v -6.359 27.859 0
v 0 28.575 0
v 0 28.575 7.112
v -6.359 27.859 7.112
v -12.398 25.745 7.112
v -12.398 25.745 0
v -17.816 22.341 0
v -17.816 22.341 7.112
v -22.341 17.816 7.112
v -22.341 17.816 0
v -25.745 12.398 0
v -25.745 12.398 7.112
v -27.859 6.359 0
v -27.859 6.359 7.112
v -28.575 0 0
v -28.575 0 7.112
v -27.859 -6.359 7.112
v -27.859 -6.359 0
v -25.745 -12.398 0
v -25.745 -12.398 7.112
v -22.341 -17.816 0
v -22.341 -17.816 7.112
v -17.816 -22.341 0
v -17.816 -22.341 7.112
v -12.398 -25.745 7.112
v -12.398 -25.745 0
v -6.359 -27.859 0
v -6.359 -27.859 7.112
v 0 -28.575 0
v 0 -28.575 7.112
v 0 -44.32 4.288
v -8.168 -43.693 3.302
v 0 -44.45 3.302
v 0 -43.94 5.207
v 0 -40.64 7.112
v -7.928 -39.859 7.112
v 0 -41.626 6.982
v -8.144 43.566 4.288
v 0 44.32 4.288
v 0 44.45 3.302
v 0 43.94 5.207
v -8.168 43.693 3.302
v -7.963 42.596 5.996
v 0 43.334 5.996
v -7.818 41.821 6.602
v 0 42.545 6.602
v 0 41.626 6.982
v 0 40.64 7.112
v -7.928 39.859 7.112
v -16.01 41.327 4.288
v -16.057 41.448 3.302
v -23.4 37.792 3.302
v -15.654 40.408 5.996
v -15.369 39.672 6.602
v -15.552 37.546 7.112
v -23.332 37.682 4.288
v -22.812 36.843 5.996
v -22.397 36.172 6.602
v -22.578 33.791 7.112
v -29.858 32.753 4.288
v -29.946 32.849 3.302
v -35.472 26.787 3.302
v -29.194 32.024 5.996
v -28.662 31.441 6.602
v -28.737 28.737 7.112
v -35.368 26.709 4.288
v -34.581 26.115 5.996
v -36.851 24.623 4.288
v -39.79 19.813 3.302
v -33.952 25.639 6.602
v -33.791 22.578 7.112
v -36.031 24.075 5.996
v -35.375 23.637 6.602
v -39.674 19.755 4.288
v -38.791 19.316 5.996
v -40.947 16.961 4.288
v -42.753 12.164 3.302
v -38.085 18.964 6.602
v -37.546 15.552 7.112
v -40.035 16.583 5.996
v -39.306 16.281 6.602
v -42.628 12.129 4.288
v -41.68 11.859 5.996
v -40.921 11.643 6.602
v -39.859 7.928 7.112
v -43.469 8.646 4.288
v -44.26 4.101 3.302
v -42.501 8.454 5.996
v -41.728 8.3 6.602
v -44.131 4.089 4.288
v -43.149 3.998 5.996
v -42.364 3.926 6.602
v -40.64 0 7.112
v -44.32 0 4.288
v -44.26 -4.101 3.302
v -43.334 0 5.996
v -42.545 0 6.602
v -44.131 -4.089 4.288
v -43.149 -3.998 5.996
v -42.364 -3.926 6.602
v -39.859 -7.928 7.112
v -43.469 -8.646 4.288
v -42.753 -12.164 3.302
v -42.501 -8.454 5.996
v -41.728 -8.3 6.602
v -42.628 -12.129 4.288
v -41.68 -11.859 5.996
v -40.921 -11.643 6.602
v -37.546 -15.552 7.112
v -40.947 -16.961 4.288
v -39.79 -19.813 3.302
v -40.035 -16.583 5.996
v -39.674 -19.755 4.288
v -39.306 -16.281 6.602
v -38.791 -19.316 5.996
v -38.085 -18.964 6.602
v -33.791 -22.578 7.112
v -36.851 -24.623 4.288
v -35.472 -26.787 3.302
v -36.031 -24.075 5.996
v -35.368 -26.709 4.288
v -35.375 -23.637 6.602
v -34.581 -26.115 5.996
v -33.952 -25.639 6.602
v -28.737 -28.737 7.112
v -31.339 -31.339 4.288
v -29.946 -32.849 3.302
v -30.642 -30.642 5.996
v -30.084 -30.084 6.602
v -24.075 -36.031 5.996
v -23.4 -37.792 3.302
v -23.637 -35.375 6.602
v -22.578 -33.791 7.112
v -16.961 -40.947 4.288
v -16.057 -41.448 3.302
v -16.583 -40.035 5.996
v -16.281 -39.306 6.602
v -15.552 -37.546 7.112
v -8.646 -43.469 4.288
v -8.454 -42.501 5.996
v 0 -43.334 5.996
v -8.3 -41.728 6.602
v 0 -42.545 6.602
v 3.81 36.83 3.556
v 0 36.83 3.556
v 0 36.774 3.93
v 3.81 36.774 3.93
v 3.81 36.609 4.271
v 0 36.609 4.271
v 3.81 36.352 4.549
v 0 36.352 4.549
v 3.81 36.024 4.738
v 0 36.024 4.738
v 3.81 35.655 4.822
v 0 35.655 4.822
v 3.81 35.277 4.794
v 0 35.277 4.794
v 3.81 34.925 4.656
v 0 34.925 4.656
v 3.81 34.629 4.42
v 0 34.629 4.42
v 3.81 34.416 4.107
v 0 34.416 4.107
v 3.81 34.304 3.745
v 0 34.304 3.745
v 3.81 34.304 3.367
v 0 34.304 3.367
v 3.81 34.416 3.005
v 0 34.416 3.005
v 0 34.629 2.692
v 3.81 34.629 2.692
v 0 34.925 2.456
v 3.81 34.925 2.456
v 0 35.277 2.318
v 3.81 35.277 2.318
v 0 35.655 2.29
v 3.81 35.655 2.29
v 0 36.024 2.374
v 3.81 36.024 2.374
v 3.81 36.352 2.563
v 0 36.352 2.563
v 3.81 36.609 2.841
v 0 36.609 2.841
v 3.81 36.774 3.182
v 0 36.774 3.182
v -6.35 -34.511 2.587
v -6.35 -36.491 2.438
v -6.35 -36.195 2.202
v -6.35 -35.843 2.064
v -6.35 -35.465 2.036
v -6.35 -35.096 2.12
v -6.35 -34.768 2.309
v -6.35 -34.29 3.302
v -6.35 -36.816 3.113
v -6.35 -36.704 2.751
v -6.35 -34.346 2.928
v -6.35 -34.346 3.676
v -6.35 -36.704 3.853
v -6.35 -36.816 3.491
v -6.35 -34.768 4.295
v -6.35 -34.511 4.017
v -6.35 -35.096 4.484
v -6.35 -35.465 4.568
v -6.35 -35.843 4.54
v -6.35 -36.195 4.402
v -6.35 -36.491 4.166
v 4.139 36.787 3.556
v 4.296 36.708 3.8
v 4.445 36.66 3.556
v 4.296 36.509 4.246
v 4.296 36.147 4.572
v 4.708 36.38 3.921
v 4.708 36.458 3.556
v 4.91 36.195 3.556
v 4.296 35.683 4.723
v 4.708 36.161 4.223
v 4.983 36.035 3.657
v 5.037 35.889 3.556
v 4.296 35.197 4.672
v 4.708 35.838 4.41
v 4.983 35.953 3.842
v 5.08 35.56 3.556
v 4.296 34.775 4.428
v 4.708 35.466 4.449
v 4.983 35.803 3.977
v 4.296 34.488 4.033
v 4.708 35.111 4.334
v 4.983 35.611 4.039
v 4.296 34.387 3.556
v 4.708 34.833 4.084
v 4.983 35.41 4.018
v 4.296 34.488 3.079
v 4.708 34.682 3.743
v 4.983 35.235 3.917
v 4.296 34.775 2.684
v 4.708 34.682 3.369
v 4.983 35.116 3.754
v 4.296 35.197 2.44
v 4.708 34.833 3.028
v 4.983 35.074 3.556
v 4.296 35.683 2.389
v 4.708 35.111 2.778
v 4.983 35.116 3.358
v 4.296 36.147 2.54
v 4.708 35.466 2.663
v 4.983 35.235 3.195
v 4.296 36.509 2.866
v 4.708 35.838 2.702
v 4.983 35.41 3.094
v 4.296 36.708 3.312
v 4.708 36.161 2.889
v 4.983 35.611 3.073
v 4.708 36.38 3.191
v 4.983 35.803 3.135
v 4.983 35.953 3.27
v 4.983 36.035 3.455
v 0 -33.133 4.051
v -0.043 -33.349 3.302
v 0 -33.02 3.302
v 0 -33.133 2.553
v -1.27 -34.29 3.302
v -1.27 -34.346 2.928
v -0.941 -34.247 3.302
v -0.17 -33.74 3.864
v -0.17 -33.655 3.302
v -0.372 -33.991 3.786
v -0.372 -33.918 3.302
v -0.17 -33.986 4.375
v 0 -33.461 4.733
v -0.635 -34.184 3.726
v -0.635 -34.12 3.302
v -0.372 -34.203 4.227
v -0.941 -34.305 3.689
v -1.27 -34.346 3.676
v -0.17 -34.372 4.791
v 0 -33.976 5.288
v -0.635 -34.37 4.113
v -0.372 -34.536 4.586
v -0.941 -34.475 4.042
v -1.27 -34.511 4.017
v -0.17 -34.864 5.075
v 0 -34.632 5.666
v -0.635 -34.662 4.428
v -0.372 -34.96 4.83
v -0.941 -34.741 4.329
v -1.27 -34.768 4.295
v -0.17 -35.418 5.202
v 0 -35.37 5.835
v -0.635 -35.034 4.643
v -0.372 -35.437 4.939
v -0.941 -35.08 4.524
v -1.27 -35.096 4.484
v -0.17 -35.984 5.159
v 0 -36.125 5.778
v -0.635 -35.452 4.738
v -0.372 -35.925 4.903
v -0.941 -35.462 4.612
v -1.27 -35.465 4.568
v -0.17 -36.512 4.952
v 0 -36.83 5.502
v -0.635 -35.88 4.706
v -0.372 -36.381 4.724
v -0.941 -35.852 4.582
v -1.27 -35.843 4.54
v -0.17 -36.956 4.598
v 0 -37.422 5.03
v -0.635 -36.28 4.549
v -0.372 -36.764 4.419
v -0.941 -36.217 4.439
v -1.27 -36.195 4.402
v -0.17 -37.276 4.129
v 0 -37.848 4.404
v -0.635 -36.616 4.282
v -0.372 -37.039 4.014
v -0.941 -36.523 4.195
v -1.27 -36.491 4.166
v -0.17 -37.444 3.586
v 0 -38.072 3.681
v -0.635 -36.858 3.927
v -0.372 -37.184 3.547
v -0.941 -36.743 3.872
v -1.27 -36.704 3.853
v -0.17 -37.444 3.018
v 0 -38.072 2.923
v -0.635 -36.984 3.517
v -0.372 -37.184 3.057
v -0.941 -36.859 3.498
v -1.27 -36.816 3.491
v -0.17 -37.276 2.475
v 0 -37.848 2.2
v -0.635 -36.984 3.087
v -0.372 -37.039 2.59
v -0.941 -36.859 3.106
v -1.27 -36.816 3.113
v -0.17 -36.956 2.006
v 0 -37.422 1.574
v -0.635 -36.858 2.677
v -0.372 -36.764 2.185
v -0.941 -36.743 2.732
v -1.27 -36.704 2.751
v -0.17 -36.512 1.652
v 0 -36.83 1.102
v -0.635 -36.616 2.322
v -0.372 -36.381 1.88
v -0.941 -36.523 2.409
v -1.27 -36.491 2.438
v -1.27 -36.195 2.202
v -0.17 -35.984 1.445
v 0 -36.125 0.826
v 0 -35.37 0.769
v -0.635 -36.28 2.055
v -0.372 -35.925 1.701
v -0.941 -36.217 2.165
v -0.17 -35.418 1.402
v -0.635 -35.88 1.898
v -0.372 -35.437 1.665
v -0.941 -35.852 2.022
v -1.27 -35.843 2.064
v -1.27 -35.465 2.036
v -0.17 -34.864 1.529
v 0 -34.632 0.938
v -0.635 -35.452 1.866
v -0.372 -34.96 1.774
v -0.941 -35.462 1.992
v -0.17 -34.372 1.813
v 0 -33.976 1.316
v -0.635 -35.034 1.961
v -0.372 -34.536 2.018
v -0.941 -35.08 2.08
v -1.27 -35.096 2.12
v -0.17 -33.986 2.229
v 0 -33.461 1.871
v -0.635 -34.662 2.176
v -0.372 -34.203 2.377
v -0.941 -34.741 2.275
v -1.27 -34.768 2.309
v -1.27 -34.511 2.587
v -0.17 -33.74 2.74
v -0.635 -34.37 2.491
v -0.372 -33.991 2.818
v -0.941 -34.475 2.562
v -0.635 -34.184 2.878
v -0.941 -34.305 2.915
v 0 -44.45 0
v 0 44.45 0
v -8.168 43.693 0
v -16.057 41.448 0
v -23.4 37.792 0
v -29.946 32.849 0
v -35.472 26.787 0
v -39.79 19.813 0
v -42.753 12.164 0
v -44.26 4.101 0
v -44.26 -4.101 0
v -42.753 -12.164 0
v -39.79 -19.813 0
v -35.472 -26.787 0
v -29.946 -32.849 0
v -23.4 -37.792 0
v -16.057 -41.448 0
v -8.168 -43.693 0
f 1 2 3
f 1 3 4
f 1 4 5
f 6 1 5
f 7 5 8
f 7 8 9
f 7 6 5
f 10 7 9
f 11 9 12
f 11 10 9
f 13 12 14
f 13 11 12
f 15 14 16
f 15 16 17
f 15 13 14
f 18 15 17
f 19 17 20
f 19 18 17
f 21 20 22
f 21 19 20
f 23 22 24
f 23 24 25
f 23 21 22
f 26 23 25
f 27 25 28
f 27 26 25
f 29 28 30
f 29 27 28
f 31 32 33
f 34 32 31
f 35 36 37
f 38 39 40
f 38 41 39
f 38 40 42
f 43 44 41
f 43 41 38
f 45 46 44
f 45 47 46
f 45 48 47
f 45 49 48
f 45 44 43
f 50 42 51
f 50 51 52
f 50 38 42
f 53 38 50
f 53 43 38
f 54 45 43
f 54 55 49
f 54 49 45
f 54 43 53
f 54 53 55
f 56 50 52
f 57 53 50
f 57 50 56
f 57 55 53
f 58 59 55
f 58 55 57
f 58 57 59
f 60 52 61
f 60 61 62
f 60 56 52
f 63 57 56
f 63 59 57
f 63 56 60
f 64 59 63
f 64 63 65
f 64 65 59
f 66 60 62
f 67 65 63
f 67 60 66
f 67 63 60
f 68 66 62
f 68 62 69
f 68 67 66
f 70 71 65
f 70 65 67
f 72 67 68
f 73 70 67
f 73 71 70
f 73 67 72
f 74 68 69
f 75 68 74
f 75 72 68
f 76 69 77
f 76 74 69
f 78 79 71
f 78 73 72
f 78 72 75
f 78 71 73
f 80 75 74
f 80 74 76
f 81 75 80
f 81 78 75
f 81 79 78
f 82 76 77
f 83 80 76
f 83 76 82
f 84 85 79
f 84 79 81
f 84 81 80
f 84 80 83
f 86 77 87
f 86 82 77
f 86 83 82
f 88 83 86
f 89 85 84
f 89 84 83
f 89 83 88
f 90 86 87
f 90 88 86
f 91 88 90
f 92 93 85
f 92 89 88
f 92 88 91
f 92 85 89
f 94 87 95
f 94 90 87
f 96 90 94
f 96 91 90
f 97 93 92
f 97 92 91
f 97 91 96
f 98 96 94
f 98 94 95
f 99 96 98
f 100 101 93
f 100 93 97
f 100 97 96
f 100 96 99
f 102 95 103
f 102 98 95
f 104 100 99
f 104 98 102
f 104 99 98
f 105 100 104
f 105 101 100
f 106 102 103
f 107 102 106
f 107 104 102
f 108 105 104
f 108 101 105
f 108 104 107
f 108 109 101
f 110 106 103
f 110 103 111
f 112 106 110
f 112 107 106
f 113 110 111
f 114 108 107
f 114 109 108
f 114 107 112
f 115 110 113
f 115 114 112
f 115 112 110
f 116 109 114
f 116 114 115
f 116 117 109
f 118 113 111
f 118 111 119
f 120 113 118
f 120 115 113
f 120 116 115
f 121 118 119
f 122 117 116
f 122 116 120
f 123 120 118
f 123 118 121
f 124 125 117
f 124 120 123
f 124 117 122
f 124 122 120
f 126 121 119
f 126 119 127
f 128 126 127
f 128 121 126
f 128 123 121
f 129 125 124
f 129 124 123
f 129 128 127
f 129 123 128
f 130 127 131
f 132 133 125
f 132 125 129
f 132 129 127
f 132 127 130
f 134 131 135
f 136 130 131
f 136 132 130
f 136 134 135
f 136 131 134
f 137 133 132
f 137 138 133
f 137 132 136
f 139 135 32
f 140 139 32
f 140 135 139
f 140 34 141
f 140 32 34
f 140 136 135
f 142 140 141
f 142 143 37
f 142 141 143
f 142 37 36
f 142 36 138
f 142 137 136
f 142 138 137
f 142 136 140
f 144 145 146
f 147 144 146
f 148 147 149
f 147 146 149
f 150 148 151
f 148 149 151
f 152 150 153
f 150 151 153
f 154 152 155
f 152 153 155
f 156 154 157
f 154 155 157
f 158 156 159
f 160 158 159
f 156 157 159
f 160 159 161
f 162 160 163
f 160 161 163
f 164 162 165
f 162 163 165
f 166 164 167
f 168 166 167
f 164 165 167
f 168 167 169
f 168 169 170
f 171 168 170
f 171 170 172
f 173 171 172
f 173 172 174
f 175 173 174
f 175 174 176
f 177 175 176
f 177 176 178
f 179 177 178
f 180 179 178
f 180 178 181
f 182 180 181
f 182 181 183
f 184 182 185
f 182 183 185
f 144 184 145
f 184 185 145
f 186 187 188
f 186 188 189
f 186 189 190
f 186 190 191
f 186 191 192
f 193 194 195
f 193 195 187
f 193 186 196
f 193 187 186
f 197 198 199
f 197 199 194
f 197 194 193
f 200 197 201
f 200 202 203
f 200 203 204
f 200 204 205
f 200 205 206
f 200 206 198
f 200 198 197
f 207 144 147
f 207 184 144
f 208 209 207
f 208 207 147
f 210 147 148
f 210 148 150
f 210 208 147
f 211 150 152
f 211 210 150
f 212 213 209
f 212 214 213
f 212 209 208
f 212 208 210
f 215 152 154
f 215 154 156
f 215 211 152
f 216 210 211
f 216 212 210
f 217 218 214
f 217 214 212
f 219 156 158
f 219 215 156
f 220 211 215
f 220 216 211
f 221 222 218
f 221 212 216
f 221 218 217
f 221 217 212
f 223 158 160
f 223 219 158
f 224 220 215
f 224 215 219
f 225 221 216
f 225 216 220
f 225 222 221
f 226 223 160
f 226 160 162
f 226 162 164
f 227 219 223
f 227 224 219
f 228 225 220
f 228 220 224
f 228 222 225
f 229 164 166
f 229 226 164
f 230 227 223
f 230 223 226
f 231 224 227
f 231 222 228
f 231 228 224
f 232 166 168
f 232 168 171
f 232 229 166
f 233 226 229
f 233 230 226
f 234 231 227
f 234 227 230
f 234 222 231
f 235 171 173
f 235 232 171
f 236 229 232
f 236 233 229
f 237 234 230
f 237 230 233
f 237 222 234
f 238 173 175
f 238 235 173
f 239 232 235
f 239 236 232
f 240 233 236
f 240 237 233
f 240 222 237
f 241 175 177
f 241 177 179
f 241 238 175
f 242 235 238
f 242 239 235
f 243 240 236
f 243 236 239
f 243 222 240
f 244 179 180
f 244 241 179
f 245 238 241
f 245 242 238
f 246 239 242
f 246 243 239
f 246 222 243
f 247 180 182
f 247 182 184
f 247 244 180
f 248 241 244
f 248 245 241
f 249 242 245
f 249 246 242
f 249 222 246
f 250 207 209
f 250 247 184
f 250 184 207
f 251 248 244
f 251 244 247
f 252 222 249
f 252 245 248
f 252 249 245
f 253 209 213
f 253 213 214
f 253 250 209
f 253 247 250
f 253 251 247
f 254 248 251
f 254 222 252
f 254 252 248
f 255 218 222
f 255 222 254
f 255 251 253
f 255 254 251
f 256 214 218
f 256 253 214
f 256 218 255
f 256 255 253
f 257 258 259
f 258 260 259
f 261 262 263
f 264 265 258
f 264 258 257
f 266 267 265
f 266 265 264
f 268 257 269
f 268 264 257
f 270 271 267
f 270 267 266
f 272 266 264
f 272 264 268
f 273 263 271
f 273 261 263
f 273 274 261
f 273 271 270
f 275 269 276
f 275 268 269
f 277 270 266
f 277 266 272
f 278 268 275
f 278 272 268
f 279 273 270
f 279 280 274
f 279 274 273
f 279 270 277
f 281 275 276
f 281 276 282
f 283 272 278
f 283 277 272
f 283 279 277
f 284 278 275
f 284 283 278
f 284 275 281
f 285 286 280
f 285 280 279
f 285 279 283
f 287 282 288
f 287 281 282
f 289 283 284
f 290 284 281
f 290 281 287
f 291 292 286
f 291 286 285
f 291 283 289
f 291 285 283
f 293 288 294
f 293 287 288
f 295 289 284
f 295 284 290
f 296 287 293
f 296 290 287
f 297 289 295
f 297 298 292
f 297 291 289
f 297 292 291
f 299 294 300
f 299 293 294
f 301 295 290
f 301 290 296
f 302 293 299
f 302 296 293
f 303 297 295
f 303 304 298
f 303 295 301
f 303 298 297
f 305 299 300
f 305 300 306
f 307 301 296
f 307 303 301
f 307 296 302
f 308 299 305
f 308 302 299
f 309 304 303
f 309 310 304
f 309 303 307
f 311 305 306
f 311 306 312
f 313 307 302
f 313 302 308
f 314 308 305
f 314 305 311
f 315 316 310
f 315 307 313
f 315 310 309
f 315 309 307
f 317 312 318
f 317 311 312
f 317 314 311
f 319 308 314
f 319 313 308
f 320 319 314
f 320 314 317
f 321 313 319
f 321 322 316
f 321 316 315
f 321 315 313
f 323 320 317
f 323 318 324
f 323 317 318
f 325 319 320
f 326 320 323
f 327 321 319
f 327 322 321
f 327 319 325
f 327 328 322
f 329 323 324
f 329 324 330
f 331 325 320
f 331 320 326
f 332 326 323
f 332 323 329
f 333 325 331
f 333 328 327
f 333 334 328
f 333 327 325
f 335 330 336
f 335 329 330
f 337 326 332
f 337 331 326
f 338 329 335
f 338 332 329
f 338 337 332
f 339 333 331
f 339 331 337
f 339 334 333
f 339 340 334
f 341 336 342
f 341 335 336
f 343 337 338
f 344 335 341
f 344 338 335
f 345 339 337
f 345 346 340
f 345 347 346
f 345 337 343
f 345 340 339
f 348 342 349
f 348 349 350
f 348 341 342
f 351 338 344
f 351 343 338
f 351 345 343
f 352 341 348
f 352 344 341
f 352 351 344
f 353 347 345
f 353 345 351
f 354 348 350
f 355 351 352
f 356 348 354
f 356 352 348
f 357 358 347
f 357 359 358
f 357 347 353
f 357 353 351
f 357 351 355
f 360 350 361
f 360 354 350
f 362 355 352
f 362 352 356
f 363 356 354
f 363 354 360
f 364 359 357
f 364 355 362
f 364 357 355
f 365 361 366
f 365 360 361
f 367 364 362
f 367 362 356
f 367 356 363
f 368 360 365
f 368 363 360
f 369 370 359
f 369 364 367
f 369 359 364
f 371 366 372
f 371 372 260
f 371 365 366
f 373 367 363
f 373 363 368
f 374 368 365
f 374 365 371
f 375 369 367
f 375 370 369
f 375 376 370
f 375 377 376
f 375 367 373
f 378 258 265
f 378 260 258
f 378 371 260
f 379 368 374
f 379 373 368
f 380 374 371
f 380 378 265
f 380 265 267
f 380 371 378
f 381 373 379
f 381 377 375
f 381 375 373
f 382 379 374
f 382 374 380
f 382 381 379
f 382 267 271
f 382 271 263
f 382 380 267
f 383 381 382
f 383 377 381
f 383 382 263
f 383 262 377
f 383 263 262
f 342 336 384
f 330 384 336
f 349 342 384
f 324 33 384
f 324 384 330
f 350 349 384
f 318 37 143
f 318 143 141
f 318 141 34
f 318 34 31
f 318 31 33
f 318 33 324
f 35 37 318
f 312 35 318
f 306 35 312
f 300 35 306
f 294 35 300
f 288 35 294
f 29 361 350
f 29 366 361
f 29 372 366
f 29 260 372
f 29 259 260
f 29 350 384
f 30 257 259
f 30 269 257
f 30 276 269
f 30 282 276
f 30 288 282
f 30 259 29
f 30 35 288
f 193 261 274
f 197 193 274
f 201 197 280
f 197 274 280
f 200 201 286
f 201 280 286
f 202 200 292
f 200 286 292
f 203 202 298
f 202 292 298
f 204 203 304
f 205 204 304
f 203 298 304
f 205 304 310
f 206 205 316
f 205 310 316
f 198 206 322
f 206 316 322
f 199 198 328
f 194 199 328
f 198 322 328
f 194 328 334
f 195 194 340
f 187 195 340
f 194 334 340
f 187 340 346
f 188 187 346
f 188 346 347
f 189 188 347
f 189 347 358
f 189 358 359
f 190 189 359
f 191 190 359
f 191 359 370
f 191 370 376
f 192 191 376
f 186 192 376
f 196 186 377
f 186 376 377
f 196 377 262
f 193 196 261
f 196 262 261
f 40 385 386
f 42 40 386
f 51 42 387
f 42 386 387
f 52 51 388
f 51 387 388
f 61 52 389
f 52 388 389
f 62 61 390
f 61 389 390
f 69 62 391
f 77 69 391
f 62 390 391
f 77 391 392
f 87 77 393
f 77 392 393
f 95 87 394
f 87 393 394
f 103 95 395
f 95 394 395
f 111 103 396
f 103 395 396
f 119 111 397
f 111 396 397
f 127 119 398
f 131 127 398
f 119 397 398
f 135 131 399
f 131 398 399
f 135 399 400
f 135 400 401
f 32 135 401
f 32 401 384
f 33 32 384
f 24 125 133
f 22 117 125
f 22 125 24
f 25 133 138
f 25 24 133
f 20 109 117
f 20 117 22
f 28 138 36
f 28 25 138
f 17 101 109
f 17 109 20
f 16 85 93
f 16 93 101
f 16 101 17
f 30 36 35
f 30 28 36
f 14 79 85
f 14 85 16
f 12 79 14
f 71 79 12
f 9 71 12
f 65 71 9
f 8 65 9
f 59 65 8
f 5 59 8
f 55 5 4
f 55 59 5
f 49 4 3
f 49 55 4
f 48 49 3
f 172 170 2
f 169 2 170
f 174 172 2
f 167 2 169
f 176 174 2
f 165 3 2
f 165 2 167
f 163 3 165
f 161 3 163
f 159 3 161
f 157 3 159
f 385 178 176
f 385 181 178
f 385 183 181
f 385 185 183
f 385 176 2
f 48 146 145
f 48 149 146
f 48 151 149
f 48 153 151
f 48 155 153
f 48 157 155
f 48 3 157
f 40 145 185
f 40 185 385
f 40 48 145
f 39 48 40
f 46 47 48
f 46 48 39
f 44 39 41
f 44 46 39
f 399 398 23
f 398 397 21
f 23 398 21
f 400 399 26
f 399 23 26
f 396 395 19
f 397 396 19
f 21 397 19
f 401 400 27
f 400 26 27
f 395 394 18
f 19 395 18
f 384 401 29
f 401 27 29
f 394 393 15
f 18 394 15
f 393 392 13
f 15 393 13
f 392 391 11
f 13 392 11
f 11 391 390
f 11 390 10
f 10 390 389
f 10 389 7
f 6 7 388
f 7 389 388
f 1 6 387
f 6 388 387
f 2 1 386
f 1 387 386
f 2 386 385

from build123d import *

# Parameters (mm, degrees)
F0_R     = 44.45
F0_R_2   = 28.575
F1_DEPTH = 7.112
F2_R     = 3.81
F3_W     = 80.1546871662
F3_H     = 130.5045634508
F4_DEPTH = 12.7
F6_R     = 1.27
F7_DEPTH = 5.08
F5_R     = 1.27
F8_DEPTH = 6.35
F9_R     = 1.27


with BuildPart() as f1:
    # F0 (on Top) → F1 (new body)
    with BuildSketch(Plane.XY):
        Circle(F0_R)
        Circle(F0_R_2, mode=Mode.SUBTRACT)
    extrude(amount=F1_DEPTH)

    # F2
    f2_edges = [f1.edges().sort_by_distance(p)[0] for p in [
        (-44.45, 0, 7.112),
    ]]
    fillet(f2_edges, radius=F2_R)

    # F3 (on Top) → F4 (cut, symmetric)
    with BuildSketch(Plane.XY):
        with Locations((40.0773435831, -1.4468356967)):
            Rectangle(F3_W, F3_H)
    extrude(amount=F4_DEPTH, both=True, mode=Mode.SUBTRACT)

    # F6 (on face) → F7 (join)
    with BuildSketch(Plane.YZ):
        with Locations((35.56, 3.556)):
            Circle(F6_R)
    extrude(amount=F7_DEPTH)

    # F5 (on face) → F8 (cut)
    with BuildSketch(Plane.YZ):
        with Locations((-35.56, 3.302)):
            Circle(F5_R)
    extrude(amount=-F8_DEPTH, mode=Mode.SUBTRACT)

    # F9
    f9_edges = [f1.edges().sort_by_distance(p)[0] for p in [
        (5.08, 34.29, 3.556),
        (0, -36.83, 3.302),
    ]]
    fillet(f9_edges, radius=F9_R)


solid = f1.part
